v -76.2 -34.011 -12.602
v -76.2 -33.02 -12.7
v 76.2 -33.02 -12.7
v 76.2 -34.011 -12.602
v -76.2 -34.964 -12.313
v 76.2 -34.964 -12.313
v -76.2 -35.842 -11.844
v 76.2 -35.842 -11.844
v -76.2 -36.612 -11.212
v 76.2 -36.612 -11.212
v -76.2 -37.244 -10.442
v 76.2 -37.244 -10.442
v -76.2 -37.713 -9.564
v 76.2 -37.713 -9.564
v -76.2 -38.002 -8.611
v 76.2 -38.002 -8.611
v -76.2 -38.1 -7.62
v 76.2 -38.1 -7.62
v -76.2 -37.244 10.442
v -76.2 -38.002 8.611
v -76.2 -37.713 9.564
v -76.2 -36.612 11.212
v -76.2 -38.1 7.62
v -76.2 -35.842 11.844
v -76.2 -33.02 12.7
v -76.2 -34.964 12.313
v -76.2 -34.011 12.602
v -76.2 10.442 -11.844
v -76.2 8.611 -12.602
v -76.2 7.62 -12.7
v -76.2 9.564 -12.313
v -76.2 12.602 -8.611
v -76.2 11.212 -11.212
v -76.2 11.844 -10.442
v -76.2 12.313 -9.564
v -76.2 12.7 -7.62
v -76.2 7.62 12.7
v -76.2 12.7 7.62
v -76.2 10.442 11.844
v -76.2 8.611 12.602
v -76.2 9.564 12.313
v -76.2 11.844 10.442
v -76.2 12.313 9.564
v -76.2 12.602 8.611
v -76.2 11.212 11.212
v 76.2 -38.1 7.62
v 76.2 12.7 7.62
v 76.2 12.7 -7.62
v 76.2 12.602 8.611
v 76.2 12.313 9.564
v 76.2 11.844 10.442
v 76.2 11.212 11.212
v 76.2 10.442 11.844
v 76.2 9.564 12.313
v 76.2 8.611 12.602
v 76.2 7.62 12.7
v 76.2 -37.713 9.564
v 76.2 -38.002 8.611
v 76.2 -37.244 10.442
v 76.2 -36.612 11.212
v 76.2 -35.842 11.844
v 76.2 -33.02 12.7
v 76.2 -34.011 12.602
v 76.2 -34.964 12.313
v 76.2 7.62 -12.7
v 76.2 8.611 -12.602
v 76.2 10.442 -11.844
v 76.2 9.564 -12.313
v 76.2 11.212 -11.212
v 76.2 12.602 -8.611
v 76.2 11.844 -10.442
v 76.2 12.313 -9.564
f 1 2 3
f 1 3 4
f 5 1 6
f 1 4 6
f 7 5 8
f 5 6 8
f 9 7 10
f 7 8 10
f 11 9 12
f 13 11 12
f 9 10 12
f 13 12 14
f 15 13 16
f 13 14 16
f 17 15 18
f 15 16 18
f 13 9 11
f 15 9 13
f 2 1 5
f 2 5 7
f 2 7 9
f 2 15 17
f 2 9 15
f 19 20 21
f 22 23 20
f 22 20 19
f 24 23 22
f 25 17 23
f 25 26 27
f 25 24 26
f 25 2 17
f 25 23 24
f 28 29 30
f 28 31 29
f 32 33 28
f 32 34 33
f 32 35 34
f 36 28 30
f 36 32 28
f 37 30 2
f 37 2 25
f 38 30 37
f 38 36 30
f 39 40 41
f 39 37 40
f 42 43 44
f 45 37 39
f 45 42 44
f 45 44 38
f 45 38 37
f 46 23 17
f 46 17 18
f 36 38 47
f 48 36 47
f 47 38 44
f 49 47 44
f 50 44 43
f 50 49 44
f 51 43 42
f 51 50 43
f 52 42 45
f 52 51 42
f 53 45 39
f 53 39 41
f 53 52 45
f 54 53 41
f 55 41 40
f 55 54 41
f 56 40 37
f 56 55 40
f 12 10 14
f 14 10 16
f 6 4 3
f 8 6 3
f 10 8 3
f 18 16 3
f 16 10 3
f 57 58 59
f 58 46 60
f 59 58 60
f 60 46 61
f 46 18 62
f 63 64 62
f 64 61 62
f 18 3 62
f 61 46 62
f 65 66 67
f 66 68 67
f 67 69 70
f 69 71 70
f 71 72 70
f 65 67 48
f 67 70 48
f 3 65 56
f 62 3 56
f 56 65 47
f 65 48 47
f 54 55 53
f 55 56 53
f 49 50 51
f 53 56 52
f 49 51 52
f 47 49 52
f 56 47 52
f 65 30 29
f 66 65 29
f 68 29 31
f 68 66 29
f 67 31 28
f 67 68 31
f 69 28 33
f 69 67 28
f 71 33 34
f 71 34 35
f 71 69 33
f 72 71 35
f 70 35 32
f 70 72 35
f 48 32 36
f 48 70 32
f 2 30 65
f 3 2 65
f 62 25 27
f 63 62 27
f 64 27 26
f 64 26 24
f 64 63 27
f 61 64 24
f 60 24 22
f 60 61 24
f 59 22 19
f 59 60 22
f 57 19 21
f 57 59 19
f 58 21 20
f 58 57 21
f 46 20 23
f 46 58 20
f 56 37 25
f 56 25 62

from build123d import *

# Parameters (mm, degrees)
F0_W     = 152.4
F0_H     = 25.4
F1_DEPTH = 12.7
F2_DEPTH = 25.4
F3_R     = 5.08


with BuildPart() as f1:
    # F0 (on Front) → F1 (new body, symmetric)
    with BuildSketch(Plane.XZ):
        Rectangle(F0_W, F0_H)
    extrude(amount=F1_DEPTH, both=True)

    # F2 (add): a face of the model
    f2_faces = [f1.faces().sort_by_distance(p)[0] for p in [
        (0, -12.7, 0),
    ]]
    extrude(f2_faces, amount=F2_DEPTH)

    # F3
    f3_edges = [f1.edges().sort_by_distance(p)[0] for p in [
        (0, -38.1, 12.7),
        (0, -38.1, -12.7),
        (0, 12.7, 12.7),
        (0, 12.7, -12.7),
    ]]
    fillet(f3_edges, radius=F3_R)


solid = f1.part
